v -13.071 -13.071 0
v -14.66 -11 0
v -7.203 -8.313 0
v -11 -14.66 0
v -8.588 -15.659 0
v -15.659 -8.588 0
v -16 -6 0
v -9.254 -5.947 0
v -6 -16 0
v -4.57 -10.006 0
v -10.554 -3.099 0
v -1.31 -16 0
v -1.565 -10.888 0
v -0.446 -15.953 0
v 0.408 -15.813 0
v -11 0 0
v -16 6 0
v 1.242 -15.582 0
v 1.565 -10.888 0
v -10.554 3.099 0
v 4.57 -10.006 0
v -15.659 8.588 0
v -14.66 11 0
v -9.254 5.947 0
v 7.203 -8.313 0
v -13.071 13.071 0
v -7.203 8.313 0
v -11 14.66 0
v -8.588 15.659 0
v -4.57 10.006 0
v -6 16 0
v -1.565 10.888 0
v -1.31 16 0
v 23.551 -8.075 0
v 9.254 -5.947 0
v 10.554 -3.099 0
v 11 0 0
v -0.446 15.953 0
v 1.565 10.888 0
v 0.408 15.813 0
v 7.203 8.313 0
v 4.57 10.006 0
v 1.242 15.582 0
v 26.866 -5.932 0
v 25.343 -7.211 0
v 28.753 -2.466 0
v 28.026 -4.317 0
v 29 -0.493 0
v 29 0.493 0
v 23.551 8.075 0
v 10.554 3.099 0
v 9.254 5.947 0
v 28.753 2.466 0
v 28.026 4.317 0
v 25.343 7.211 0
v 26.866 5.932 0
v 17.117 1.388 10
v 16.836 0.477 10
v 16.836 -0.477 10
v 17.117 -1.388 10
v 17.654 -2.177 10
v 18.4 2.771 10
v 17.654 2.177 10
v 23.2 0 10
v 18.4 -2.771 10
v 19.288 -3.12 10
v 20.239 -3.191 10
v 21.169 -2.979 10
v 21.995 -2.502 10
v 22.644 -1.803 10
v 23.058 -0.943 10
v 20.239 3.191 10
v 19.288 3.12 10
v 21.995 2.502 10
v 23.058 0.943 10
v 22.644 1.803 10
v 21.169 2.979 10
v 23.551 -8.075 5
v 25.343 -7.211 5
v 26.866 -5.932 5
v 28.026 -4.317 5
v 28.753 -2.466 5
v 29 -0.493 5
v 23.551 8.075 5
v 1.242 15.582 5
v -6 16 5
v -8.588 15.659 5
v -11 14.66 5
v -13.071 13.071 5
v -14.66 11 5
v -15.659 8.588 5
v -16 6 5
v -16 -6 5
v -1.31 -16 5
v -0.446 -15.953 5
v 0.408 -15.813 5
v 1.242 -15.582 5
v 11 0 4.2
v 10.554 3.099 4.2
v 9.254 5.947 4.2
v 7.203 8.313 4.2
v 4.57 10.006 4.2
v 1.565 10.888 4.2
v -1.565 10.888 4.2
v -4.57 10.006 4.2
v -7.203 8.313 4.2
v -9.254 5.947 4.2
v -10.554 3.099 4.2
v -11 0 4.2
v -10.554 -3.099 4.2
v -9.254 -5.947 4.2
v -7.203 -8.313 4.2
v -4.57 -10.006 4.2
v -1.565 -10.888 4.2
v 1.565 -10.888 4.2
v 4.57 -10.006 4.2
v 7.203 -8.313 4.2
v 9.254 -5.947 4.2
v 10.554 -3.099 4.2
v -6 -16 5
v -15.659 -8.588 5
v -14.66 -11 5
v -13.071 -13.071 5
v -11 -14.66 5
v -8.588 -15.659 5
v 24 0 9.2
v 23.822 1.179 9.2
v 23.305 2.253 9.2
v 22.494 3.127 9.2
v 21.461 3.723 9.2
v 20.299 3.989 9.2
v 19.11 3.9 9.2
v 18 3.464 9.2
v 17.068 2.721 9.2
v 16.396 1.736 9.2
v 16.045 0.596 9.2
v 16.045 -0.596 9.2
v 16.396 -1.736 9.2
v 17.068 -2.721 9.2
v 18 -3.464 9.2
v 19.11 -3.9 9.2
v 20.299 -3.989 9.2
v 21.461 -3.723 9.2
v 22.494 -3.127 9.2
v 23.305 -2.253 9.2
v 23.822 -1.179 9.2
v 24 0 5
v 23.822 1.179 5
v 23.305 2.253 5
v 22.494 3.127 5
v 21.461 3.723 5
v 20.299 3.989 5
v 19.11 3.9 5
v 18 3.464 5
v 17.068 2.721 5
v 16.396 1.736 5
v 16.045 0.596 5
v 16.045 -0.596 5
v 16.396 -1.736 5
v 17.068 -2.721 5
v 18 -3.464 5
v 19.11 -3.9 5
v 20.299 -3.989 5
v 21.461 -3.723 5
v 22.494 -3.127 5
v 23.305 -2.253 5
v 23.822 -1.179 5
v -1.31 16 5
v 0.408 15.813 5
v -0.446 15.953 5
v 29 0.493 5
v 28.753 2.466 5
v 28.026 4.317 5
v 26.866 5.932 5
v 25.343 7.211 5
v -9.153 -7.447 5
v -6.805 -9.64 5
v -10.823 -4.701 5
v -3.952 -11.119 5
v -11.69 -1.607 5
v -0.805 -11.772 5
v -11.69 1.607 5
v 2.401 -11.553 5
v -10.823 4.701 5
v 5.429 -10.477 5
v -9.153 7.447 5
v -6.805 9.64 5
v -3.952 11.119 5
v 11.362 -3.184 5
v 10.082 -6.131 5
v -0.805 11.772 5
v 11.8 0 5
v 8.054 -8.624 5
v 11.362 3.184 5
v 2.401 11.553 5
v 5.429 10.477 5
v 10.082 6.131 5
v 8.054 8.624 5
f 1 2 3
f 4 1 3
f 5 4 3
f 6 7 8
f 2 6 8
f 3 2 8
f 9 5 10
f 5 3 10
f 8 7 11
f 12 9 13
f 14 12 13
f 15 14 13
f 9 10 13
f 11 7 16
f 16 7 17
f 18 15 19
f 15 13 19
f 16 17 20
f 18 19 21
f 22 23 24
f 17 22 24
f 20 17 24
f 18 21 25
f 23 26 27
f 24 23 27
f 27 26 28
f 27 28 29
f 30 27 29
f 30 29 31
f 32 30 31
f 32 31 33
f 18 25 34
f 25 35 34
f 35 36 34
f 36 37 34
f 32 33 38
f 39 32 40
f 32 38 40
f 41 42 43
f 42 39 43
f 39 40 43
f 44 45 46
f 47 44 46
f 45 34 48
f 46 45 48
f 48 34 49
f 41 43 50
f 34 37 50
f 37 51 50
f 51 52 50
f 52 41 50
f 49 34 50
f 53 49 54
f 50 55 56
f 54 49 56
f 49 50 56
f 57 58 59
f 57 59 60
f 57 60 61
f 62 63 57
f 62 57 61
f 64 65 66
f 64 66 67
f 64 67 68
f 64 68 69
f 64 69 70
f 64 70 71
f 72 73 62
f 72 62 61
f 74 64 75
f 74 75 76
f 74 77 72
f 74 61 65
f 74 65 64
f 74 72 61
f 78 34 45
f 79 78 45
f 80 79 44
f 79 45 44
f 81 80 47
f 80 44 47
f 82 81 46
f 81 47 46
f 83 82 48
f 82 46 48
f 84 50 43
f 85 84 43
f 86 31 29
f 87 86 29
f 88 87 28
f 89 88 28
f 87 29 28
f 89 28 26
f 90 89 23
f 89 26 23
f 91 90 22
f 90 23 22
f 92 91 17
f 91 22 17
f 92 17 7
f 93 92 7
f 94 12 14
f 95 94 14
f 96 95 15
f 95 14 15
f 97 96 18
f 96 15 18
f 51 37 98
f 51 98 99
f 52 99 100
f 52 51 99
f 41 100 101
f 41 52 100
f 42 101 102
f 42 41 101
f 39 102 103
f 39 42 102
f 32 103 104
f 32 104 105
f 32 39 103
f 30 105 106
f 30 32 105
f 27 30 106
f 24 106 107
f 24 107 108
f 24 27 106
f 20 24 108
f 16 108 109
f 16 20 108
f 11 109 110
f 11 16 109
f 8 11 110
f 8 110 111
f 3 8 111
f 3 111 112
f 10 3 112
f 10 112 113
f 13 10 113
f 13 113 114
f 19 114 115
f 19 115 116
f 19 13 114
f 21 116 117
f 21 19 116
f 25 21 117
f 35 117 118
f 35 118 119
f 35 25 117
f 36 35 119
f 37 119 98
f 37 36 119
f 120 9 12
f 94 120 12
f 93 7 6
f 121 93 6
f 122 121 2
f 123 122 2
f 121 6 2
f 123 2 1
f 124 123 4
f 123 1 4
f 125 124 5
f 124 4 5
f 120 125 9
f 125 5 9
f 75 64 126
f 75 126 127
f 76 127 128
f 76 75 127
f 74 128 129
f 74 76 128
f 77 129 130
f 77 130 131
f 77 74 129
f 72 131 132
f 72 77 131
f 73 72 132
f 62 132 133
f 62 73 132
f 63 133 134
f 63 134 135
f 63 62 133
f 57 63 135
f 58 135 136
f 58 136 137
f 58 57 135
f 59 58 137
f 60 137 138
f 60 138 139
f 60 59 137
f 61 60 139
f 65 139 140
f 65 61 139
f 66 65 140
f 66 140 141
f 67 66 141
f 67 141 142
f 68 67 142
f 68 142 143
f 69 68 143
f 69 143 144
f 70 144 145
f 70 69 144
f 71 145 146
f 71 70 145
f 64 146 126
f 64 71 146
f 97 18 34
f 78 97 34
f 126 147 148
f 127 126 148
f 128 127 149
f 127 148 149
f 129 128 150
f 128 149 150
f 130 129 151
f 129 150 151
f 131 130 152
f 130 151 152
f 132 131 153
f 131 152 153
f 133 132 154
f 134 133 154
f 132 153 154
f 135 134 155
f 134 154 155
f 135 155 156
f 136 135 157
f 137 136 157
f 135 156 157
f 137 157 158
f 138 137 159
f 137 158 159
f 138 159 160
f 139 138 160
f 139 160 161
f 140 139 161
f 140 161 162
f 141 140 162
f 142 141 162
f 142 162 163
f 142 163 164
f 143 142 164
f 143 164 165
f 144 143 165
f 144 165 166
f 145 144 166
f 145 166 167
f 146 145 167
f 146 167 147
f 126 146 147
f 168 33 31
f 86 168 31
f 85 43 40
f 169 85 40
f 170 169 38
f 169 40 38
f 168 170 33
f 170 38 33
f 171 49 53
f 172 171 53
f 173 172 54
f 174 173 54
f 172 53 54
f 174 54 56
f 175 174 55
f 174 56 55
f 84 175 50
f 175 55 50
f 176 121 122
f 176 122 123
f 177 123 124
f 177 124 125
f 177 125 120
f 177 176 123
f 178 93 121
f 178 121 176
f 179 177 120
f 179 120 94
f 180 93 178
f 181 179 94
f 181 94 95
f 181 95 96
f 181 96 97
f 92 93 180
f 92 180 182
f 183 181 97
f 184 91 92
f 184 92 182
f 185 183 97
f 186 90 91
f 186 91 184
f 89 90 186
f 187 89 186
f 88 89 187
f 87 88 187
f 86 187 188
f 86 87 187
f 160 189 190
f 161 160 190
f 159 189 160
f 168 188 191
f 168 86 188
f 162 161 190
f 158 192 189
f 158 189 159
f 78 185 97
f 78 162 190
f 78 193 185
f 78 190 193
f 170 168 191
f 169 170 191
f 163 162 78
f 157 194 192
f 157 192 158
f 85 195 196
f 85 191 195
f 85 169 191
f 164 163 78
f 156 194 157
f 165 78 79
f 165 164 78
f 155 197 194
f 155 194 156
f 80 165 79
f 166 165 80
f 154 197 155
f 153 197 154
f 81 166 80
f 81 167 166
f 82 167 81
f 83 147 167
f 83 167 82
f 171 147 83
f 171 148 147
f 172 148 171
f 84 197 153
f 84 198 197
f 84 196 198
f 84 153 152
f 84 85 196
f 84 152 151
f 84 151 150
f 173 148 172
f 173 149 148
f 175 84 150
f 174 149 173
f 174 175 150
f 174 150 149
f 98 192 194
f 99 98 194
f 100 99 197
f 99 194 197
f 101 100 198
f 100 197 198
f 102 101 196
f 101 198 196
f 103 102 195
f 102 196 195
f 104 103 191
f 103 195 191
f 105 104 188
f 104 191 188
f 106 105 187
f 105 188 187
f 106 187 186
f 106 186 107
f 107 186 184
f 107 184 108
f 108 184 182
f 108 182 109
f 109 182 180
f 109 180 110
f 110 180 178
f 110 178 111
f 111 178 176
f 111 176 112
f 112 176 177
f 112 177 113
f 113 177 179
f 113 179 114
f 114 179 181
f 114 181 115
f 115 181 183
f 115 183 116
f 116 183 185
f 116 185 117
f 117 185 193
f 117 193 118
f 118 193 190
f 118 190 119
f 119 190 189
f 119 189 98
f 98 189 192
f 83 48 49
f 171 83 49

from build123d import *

# Parameters (mm, degrees)
F0_R     = 11
F0_R_2   = 4
F1_DEPTH = 5
F2_DEPTH = 10
F3_SIZE  = 0.8


with BuildPart() as f1:
    # F0 (on Top) → F1 (new body)
    with BuildSketch(Plane.XY):
        with BuildLine():
            Line((-1.3099432081, 16), (-6, 16))
            ThreePointArc((-6, 16), (-13.0710678119, 13.0710678119), (-16, 6))
            Line((-16, 6), (-16, -6))
            ThreePointArc((-16, -6), (-13.0710678119, -13.0710678119), (-6, -16))
            Line((-6, -16), (-1.3099432081, -16))
            ThreePointArc((-1.3099432081, -16), (-0.0172155068, -15.8948625758), (1.2415336792, -15.5822137726))
            Line((1.2415336792, -15.5822137726), (23.5514768872, -8.074735593))
            ThreePointArc((23.5514768872, -8.074735593), (27.4966073876, -5.1609361605), (29, -0.4925218204))
            Line((29, -0.4925218204), (29, 0.4925218204))
            ThreePointArc((29, 0.4925218204), (27.4966073876, 5.1609361605), (23.5514768872, 8.074735593))
            Line((23.5514768872, 8.074735593), (1.2415336792, 15.5822137726))
            ThreePointArc((1.2415336792, 15.5822137726), (-0.0172155068, 15.8948625758), (-1.3099432081, 16))
        make_face()
        Circle(F0_R, mode=Mode.SUBTRACT)
        with Locations((20, 0)):
            Circle(F0_R_2, mode=Mode.SUBTRACT)
        with Locations((20, 0)):
            Circle(F0_R_2)
    extrude(amount=F1_DEPTH)

    # F0 (on Top) → F2 (join, through all)
    with BuildSketch(Plane.XY):
        with Locations((20, 0)):
            Circle(F0_R_2)
    extrude(amount=F2_DEPTH)

    # F3
    f3_edges = [f1.edges().sort_by_distance(p)[0] for p in [
        (16, 0, 10),
        (-11, 0, 5),
    ]]
    chamfer(f3_edges, length=F3_SIZE)


solid = f1.part
